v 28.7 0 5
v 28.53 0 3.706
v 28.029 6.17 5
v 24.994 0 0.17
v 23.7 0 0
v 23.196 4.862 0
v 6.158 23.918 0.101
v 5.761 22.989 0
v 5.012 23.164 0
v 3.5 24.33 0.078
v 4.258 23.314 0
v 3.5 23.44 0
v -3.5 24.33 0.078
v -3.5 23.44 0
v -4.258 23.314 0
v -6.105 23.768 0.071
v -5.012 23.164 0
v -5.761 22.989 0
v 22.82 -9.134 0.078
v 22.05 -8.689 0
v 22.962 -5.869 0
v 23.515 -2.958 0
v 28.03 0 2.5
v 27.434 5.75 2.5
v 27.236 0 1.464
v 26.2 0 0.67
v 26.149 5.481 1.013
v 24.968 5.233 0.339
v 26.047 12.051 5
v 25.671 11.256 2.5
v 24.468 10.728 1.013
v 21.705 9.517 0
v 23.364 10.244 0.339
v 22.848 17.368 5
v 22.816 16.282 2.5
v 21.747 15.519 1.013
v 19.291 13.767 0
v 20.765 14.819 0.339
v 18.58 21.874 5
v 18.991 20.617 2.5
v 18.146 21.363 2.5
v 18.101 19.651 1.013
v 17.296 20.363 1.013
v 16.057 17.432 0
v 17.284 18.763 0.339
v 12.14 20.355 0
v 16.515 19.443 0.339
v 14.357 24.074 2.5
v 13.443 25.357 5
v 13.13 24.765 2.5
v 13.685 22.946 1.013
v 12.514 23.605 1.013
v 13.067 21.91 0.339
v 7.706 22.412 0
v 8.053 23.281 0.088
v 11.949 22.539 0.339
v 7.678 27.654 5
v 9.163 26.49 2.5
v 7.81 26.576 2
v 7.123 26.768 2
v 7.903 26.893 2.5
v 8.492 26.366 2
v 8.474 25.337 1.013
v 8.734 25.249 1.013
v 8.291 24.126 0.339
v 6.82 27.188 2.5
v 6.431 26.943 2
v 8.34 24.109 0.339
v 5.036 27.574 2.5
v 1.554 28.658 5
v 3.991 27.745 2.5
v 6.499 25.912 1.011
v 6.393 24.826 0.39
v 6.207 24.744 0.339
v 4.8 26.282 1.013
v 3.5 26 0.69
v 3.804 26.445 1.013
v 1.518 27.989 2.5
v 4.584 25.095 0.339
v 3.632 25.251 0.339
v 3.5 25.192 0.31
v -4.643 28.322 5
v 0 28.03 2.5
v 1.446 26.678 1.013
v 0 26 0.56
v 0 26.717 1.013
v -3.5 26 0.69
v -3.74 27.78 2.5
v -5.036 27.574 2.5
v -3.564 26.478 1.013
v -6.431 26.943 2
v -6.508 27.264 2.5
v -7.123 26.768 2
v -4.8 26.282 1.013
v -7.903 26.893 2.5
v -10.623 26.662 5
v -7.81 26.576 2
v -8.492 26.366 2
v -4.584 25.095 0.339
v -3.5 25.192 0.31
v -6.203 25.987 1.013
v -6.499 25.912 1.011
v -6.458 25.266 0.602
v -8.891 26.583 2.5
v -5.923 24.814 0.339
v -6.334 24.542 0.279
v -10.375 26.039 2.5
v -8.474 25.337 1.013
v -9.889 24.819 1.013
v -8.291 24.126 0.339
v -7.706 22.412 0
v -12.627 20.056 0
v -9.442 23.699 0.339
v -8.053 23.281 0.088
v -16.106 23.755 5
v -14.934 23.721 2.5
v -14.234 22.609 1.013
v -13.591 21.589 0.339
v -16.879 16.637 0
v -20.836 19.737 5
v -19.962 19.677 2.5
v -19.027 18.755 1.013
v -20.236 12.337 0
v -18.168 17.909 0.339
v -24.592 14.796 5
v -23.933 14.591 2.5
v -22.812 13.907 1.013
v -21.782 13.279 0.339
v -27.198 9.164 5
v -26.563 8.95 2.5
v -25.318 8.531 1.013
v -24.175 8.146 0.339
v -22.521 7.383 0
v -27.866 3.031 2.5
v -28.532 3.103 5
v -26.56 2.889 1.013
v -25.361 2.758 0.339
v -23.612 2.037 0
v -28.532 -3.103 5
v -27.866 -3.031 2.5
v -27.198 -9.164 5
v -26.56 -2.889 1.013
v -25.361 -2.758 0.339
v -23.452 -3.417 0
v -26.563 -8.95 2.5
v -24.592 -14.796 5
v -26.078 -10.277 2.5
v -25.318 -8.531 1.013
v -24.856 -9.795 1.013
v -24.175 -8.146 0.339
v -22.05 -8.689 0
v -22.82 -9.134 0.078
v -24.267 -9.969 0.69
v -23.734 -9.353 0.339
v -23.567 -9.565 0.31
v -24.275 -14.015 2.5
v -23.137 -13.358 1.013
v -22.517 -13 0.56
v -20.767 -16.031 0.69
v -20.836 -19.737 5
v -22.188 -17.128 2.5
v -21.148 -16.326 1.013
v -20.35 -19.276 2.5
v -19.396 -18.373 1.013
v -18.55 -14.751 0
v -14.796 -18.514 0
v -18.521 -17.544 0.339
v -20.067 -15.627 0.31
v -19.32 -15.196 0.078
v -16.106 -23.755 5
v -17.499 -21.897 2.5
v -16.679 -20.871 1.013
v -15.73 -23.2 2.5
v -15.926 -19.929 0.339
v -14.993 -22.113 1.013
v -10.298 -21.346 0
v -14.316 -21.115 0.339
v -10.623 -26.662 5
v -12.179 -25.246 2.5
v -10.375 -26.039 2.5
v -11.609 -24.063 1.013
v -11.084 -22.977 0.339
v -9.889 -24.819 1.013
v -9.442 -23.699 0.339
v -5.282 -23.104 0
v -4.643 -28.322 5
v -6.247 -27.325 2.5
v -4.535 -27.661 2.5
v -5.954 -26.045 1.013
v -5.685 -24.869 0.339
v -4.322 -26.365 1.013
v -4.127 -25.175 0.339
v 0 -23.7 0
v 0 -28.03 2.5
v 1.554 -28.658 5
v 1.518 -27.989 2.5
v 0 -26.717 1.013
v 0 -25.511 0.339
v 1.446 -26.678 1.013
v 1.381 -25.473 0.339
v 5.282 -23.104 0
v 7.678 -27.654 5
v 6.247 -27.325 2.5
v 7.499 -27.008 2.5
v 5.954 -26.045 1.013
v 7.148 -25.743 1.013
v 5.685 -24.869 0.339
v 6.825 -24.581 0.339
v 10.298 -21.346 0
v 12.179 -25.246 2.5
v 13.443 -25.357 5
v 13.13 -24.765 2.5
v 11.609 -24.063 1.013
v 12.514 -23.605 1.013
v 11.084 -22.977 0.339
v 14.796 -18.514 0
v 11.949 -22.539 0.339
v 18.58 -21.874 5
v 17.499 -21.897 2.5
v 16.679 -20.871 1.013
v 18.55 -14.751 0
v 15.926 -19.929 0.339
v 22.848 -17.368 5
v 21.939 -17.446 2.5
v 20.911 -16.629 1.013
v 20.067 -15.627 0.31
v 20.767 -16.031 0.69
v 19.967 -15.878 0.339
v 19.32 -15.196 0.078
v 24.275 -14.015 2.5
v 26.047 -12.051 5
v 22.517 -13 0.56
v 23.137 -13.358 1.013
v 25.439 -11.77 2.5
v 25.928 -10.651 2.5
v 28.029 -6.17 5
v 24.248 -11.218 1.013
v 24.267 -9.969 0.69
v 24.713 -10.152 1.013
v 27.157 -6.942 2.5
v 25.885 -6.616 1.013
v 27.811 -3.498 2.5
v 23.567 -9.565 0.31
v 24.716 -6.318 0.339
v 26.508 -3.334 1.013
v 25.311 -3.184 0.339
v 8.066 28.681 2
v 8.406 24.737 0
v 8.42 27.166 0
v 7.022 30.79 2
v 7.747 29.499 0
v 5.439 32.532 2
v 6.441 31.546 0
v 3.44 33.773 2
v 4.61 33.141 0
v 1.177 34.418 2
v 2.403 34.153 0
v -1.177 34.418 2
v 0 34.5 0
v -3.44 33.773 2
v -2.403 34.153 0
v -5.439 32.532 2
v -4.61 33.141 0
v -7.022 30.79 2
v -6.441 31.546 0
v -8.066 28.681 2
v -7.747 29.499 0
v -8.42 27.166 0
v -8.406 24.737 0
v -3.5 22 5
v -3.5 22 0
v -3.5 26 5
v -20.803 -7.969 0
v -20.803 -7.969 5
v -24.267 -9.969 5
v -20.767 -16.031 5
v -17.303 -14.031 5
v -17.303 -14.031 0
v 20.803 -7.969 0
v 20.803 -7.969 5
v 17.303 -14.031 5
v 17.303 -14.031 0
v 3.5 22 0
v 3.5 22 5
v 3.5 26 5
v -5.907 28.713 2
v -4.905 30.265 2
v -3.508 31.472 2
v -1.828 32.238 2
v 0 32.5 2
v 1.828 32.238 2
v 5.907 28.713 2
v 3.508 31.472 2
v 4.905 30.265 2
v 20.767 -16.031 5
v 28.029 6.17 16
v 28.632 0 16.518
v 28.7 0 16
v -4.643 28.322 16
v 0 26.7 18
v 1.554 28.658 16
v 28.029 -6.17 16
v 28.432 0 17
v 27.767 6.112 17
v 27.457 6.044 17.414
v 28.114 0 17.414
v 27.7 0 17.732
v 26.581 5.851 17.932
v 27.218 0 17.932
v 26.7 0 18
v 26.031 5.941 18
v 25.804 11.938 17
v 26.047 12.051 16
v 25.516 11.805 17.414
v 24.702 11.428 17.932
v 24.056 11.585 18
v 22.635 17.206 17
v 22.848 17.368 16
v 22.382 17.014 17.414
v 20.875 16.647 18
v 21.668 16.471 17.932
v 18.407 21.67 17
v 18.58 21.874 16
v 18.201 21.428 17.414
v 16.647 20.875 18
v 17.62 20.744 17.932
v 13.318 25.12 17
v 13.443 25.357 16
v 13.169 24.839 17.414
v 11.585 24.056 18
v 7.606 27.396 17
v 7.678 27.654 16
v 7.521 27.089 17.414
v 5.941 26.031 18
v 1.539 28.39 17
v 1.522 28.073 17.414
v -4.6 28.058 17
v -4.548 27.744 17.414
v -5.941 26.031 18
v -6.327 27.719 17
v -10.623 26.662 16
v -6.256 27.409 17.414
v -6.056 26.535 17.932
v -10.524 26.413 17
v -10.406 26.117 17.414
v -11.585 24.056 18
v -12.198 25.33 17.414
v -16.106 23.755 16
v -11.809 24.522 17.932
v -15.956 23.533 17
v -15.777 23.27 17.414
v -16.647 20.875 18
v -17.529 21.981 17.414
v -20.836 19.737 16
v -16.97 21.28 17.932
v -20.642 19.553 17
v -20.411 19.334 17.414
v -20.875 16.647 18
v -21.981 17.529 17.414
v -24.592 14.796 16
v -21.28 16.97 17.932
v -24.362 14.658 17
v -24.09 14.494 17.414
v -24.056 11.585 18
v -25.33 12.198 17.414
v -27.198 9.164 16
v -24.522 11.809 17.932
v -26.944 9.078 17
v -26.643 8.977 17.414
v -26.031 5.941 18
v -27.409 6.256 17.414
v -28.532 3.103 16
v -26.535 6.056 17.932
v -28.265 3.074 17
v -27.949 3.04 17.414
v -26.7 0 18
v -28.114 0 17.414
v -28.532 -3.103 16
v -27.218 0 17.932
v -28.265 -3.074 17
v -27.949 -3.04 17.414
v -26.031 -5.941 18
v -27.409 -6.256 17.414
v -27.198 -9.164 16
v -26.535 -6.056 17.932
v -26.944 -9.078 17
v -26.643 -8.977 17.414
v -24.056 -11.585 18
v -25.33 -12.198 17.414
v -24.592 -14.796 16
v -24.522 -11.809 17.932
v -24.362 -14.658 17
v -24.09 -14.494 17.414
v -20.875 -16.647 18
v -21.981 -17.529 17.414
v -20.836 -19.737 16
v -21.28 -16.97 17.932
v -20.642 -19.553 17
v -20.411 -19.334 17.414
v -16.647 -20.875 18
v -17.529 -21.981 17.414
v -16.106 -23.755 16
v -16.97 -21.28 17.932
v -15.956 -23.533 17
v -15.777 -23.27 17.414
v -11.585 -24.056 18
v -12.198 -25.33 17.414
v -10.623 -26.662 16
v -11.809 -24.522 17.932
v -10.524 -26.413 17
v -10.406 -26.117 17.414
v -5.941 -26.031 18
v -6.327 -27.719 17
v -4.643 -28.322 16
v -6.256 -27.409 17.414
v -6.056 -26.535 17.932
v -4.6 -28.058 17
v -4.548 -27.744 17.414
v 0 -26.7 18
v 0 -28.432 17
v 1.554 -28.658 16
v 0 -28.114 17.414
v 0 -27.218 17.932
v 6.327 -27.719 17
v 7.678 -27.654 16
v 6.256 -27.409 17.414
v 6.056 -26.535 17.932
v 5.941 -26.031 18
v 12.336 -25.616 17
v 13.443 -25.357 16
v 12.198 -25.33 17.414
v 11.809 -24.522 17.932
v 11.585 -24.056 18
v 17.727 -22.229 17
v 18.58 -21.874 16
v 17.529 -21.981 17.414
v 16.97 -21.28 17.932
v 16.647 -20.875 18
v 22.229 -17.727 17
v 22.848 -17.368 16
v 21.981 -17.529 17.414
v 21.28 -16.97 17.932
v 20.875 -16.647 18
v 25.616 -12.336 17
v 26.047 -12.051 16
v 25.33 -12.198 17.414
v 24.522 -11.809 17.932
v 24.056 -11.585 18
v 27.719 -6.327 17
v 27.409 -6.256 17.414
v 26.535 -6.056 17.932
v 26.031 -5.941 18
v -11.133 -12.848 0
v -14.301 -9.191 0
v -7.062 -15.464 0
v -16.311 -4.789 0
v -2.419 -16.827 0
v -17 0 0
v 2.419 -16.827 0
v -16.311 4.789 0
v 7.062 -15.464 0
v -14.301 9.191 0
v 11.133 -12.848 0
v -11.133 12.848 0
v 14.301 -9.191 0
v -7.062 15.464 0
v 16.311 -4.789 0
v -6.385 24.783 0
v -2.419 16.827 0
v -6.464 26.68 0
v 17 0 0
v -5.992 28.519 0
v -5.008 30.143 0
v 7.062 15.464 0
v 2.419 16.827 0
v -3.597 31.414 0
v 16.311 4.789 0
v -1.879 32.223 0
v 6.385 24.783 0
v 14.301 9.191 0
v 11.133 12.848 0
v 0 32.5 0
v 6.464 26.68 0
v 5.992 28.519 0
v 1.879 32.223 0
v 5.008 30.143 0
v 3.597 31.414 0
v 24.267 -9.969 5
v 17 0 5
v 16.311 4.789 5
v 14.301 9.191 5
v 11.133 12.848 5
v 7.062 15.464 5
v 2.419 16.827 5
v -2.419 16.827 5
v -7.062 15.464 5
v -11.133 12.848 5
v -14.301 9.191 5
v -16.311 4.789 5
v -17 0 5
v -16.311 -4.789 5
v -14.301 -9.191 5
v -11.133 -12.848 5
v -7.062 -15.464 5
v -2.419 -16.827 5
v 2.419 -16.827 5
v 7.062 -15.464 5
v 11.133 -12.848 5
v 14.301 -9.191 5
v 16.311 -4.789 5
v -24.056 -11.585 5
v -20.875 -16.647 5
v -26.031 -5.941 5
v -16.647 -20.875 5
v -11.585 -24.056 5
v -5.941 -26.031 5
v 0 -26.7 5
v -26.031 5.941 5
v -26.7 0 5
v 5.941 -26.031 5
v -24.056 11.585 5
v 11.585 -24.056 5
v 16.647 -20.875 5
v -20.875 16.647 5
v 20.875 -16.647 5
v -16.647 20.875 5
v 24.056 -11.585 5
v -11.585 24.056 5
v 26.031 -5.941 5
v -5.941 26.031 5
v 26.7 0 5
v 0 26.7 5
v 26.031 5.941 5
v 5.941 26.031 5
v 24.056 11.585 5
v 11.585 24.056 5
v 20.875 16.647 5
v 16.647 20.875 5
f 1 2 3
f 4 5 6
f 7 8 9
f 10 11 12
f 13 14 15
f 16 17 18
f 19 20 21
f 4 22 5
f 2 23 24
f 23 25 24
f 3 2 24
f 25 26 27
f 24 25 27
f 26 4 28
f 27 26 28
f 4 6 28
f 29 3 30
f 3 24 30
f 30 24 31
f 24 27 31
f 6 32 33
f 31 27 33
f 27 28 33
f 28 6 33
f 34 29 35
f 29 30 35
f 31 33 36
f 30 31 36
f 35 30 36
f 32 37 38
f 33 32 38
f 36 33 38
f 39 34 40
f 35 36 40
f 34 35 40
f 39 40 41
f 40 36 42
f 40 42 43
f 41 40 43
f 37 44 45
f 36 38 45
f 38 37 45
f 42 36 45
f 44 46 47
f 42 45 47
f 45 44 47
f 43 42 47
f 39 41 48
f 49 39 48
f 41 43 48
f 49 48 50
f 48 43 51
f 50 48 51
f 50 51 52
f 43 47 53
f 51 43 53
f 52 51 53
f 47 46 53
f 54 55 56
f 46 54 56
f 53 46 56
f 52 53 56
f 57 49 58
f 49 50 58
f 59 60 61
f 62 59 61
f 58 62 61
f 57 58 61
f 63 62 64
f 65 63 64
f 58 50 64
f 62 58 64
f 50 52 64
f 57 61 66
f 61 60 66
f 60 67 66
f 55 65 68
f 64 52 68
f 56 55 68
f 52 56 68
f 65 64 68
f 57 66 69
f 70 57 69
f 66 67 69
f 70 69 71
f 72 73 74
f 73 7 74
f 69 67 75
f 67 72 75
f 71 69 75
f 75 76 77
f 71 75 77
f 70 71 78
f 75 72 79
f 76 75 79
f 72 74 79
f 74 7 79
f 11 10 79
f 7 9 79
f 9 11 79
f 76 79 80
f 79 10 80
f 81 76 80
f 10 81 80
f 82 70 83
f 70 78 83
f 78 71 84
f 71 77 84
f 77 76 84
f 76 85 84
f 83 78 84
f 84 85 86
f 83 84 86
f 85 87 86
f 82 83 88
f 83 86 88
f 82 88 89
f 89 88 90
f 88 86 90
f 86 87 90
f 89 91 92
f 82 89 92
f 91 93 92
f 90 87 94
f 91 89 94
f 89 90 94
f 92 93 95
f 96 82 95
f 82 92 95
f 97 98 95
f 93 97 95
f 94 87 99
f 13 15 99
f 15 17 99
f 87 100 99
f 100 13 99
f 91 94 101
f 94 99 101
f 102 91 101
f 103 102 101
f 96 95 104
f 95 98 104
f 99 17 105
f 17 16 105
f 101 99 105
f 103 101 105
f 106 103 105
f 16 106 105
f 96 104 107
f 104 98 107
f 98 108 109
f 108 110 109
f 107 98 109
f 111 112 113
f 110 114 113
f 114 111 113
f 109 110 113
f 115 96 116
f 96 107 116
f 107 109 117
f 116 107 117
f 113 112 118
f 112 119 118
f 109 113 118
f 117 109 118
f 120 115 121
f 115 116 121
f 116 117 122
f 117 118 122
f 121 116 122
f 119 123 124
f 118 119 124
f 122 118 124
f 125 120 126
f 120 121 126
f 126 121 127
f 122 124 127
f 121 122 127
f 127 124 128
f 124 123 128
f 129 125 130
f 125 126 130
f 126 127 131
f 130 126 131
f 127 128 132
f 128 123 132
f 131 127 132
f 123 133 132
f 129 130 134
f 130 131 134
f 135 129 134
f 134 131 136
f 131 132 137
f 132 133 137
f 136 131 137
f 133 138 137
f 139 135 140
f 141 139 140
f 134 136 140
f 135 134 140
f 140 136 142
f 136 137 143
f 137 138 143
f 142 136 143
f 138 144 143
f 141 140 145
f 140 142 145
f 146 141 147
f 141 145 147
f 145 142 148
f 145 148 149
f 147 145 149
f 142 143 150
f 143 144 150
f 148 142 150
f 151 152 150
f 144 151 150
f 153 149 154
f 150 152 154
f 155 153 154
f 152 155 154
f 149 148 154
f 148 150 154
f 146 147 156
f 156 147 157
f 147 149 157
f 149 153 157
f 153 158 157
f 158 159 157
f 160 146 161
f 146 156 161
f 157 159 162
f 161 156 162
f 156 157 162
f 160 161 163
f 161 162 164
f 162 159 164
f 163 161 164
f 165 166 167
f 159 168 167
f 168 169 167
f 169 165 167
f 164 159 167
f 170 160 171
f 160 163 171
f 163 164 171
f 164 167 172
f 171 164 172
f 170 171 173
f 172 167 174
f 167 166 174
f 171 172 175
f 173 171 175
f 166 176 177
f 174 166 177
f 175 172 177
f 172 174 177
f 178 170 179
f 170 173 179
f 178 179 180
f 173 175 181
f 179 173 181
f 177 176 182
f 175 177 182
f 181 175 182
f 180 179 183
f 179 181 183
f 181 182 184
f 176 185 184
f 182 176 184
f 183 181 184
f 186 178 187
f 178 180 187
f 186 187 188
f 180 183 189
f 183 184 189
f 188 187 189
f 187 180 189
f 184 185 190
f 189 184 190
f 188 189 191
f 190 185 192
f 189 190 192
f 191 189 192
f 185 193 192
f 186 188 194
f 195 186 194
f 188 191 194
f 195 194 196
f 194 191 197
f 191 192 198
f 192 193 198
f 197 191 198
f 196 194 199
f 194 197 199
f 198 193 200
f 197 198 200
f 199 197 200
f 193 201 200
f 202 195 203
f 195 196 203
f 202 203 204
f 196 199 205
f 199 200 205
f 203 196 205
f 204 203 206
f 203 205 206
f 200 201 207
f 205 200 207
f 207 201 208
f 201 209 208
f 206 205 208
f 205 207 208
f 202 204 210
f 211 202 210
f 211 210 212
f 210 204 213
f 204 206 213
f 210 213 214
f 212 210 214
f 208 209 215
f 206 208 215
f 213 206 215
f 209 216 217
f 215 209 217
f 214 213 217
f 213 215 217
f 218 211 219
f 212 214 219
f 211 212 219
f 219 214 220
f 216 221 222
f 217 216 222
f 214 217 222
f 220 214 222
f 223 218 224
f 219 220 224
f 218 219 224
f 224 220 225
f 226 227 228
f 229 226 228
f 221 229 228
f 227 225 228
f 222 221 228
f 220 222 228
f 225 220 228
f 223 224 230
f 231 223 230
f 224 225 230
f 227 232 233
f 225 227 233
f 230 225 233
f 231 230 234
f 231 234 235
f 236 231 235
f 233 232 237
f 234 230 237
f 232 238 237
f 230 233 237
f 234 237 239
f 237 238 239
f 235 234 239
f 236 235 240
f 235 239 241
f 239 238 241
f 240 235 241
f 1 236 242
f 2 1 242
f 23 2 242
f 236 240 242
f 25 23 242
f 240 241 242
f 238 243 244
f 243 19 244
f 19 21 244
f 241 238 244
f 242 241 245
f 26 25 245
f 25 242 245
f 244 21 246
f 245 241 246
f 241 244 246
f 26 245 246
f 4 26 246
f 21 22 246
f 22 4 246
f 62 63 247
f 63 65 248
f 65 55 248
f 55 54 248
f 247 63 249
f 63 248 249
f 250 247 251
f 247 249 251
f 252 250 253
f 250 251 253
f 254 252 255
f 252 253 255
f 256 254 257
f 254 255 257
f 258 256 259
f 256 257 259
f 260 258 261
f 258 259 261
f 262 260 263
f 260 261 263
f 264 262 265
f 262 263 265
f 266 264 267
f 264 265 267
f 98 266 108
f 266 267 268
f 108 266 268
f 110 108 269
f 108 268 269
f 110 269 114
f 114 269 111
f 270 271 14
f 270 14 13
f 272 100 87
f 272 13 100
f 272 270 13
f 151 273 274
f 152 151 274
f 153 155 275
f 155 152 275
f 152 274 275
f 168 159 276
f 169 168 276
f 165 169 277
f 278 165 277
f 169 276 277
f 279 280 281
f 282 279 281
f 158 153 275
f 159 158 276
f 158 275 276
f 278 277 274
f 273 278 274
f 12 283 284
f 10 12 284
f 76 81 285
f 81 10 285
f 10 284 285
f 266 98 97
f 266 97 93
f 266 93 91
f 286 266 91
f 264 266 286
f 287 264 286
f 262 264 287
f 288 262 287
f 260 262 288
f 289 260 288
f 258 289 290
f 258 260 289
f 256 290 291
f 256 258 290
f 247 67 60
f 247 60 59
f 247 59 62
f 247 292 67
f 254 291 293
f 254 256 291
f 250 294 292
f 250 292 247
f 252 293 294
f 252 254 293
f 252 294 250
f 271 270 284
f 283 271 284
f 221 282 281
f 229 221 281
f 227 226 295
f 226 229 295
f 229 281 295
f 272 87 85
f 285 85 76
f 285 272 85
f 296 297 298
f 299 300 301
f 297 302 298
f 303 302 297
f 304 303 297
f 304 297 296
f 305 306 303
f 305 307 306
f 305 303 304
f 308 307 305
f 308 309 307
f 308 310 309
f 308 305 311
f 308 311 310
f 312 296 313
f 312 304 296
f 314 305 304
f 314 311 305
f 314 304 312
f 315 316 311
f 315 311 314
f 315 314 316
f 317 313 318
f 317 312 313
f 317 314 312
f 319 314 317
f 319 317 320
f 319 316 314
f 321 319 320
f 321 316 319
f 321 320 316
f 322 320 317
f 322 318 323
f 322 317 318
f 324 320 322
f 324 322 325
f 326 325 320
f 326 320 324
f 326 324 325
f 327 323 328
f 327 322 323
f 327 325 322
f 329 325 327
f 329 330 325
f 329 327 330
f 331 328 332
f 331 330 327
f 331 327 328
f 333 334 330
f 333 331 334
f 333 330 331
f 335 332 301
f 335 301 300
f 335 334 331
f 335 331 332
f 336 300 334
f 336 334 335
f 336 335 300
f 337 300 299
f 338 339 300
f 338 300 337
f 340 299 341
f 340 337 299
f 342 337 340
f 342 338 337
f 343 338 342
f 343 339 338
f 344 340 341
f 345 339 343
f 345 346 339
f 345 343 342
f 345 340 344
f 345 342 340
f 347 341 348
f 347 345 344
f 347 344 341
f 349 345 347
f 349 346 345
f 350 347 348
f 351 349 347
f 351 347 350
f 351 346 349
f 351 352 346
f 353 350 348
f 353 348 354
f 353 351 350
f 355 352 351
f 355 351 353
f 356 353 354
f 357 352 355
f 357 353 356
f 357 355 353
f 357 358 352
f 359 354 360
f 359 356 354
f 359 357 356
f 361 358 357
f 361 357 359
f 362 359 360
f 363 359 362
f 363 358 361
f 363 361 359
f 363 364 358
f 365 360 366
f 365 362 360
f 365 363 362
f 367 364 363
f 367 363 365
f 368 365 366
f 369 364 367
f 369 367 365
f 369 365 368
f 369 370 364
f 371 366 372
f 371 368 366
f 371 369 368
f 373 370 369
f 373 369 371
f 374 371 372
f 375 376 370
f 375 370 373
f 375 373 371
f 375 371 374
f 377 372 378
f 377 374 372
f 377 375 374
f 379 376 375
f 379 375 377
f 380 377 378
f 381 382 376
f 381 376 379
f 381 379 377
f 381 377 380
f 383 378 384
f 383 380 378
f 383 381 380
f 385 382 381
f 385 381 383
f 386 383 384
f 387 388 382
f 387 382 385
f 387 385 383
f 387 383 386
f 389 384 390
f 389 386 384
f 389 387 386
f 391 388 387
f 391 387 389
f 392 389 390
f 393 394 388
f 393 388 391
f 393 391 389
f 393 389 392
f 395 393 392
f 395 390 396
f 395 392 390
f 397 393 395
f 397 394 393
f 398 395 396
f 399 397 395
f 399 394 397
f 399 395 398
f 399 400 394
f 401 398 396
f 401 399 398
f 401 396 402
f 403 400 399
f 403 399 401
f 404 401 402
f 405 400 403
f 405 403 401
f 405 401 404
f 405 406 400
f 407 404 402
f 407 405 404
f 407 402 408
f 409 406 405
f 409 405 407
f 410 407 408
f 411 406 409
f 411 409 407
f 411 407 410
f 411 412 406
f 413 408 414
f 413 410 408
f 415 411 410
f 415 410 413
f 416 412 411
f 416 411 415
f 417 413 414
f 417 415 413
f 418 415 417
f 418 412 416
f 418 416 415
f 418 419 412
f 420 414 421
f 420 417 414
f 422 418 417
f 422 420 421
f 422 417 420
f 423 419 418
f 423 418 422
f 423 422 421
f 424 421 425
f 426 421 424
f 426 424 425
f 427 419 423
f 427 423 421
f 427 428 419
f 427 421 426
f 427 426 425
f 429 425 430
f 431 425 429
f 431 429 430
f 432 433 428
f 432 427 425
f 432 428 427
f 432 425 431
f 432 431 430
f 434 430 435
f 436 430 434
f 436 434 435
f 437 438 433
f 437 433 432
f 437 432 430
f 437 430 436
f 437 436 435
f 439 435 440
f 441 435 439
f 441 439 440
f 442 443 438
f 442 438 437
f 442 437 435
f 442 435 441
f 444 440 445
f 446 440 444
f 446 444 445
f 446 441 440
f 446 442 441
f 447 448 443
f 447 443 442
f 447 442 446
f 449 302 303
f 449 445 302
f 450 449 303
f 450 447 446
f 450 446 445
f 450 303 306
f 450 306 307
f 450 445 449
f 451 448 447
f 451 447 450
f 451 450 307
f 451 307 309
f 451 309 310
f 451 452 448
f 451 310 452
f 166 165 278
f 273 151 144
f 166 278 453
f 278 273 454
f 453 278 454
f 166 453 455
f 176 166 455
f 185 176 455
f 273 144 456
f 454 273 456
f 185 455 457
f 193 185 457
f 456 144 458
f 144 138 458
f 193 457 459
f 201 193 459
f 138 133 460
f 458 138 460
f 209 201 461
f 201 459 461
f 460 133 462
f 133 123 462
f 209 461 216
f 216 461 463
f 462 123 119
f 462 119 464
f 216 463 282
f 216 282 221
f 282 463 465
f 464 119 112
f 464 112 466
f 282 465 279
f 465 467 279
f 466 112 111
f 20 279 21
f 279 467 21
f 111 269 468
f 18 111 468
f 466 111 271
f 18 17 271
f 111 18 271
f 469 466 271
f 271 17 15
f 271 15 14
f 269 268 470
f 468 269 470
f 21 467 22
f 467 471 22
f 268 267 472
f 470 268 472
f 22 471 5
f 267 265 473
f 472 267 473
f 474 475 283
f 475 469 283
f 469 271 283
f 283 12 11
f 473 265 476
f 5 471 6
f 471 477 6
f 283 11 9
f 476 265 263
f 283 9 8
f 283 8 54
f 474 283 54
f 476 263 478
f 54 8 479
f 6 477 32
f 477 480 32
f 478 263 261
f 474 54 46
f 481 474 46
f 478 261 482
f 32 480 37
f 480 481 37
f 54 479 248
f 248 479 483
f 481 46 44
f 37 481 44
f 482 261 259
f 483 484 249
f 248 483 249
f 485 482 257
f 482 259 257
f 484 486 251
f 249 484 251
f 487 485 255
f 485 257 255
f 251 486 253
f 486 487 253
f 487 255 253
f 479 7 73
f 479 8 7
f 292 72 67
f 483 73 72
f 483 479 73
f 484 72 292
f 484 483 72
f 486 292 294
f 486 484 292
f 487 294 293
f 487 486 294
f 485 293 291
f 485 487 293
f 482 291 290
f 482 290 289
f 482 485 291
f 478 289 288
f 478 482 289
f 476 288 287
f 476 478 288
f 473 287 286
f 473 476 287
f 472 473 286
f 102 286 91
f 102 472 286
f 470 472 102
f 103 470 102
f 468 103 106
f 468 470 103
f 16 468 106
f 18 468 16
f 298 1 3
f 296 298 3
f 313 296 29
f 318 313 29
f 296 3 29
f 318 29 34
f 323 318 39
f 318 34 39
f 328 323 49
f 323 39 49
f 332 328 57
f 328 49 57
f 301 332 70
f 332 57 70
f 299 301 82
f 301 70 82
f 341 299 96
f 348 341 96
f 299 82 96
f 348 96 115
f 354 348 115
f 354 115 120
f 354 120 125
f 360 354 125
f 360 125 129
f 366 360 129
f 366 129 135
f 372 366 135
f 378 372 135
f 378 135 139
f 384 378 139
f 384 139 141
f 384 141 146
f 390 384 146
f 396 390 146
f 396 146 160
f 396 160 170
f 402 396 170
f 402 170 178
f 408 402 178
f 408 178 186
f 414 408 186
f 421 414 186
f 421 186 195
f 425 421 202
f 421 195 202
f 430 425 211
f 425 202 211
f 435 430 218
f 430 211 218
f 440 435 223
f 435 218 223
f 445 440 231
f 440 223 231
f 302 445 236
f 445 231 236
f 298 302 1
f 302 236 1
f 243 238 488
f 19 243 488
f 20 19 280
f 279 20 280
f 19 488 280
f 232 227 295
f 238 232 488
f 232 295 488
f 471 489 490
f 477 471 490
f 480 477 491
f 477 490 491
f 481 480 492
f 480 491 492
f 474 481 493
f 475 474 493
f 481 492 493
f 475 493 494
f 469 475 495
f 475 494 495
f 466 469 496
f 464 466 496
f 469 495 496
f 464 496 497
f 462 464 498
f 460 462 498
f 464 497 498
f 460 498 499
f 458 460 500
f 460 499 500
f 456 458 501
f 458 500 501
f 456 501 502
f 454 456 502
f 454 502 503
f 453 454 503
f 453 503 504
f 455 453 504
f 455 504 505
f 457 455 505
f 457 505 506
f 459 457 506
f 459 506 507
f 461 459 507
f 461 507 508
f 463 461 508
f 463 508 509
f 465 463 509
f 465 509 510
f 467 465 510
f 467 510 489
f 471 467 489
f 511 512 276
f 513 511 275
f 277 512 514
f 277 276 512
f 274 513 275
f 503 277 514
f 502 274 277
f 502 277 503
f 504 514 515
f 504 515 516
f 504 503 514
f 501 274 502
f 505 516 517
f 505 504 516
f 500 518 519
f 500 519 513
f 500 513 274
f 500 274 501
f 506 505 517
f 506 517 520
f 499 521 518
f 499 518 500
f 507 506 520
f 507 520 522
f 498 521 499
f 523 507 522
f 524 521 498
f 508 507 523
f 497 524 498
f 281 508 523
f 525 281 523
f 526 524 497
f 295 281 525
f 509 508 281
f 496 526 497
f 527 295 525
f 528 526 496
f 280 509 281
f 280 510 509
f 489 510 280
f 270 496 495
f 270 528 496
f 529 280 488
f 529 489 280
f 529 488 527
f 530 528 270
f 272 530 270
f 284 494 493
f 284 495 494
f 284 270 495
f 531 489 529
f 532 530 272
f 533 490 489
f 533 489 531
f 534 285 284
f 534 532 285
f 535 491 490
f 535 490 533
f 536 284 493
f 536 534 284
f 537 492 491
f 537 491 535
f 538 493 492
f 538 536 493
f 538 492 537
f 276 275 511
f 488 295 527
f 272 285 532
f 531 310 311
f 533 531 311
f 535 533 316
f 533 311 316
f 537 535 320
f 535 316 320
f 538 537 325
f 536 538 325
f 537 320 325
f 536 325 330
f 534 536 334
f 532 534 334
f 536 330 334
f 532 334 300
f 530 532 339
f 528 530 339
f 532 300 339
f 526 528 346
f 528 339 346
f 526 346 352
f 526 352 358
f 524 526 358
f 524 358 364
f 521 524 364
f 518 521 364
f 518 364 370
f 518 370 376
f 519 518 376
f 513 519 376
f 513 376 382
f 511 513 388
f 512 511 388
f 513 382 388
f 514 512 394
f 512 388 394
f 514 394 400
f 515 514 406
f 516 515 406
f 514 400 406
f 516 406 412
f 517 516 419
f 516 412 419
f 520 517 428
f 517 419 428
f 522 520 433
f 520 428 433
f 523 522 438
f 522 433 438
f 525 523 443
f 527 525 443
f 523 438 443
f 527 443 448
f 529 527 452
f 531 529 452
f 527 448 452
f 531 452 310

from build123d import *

# Parameters (mm, degrees)
F0_R     = 28.7
F0_R_2   = 26.7
F1_DEPTH = 18
F2_R     = 26.7
F3_DEPTH = 13
F4_R     = 17
F4_W     = 7
F4_H     = 4
F5_DEPTH = 5.001
F7_R     = 1.99999
F8_R     = 8.5
F8_R_2   = 6.5
F9_DEPTH = 2


# Not quite as in the source:
# - a fillet or chamfer that OpenCascade refuses, or shapes differently, is made with other operations: its cross-section is extruded or revolved along the edge and cut away or added
# - a fillet or chamfer is up to 0.001 mm smaller than in the source, because OpenCascade refuses the exact size


with BuildPart() as f1:
    # F0 (on Top) → F1 (new body)
    with BuildSketch(Plane.XY):
        Circle(F0_R)
        Circle(F0_R_2, mode=Mode.SUBTRACT)
        Circle(F0_R_2)
    extrude(amount=F1_DEPTH)

    # F2 (on face) → F3 (cut)
    with BuildSketch(Plane.XY.offset(18)):
        Circle(F2_R)
    extrude(amount=-F3_DEPTH, mode=Mode.SUBTRACT)

    # F4 (on face) → F5 (cut, through all)
    with BuildSketch(Plane.XY.offset(5)):
        Circle(F4_R)
        with Locations((0, 24)):
            Rectangle(F4_W, F4_H)
        Polygon((-20.8025588833, -7.9689110868), (-24.2666604984, -9.9689110868), (-20.7666604984, -16.0310889132), (-17.3025588833, -14.0310889132), align=None)
        Polygon((17.3025588833, -14.0310889132), (20.7666604984, -16.0310889132), (24.2666604984, -9.9689110868), (20.8025588833, -7.9689110868), align=None)
    extrude(amount=-F5_DEPTH, mode=Mode.SUBTRACT)

    # F6: fillet of radius 5 on 1 edges, made by hand

    # F6_s1 → F6_t2 (revolve, cut)
    with BuildSketch(Plane.XZ):
        with BuildLine():
            ThreePointArc((28.7, 5), (27.2355339059, 1.4644660941), (23.7, 0))
            Line((23.7, 0), (28.7, 0))
            Line((28.7, 0), (28.7, 5))
        make_face()
    revolve(axis=Axis((0, 0, 0), (0, 0, 1)), mode=Mode.SUBTRACT)

    # F7 (radius 2 in the source; OpenCascade refuses exactly that, so slightly less here)
    f7_edges = [f1.edges().sort_by_distance(p)[0] for p in [
        (-28.7, 0, 18),
    ]]
    fillet(f7_edges, radius=F7_R)

    # F8 (on Top) → F9 (join)
    with BuildSketch(Plane.XY):
        with Locations((0, 26)):
            Circle(F8_R)
        with Locations((0, 26)):
            Circle(F8_R_2, mode=Mode.SUBTRACT)
    extrude(amount=F9_DEPTH)


solid = f1.part
